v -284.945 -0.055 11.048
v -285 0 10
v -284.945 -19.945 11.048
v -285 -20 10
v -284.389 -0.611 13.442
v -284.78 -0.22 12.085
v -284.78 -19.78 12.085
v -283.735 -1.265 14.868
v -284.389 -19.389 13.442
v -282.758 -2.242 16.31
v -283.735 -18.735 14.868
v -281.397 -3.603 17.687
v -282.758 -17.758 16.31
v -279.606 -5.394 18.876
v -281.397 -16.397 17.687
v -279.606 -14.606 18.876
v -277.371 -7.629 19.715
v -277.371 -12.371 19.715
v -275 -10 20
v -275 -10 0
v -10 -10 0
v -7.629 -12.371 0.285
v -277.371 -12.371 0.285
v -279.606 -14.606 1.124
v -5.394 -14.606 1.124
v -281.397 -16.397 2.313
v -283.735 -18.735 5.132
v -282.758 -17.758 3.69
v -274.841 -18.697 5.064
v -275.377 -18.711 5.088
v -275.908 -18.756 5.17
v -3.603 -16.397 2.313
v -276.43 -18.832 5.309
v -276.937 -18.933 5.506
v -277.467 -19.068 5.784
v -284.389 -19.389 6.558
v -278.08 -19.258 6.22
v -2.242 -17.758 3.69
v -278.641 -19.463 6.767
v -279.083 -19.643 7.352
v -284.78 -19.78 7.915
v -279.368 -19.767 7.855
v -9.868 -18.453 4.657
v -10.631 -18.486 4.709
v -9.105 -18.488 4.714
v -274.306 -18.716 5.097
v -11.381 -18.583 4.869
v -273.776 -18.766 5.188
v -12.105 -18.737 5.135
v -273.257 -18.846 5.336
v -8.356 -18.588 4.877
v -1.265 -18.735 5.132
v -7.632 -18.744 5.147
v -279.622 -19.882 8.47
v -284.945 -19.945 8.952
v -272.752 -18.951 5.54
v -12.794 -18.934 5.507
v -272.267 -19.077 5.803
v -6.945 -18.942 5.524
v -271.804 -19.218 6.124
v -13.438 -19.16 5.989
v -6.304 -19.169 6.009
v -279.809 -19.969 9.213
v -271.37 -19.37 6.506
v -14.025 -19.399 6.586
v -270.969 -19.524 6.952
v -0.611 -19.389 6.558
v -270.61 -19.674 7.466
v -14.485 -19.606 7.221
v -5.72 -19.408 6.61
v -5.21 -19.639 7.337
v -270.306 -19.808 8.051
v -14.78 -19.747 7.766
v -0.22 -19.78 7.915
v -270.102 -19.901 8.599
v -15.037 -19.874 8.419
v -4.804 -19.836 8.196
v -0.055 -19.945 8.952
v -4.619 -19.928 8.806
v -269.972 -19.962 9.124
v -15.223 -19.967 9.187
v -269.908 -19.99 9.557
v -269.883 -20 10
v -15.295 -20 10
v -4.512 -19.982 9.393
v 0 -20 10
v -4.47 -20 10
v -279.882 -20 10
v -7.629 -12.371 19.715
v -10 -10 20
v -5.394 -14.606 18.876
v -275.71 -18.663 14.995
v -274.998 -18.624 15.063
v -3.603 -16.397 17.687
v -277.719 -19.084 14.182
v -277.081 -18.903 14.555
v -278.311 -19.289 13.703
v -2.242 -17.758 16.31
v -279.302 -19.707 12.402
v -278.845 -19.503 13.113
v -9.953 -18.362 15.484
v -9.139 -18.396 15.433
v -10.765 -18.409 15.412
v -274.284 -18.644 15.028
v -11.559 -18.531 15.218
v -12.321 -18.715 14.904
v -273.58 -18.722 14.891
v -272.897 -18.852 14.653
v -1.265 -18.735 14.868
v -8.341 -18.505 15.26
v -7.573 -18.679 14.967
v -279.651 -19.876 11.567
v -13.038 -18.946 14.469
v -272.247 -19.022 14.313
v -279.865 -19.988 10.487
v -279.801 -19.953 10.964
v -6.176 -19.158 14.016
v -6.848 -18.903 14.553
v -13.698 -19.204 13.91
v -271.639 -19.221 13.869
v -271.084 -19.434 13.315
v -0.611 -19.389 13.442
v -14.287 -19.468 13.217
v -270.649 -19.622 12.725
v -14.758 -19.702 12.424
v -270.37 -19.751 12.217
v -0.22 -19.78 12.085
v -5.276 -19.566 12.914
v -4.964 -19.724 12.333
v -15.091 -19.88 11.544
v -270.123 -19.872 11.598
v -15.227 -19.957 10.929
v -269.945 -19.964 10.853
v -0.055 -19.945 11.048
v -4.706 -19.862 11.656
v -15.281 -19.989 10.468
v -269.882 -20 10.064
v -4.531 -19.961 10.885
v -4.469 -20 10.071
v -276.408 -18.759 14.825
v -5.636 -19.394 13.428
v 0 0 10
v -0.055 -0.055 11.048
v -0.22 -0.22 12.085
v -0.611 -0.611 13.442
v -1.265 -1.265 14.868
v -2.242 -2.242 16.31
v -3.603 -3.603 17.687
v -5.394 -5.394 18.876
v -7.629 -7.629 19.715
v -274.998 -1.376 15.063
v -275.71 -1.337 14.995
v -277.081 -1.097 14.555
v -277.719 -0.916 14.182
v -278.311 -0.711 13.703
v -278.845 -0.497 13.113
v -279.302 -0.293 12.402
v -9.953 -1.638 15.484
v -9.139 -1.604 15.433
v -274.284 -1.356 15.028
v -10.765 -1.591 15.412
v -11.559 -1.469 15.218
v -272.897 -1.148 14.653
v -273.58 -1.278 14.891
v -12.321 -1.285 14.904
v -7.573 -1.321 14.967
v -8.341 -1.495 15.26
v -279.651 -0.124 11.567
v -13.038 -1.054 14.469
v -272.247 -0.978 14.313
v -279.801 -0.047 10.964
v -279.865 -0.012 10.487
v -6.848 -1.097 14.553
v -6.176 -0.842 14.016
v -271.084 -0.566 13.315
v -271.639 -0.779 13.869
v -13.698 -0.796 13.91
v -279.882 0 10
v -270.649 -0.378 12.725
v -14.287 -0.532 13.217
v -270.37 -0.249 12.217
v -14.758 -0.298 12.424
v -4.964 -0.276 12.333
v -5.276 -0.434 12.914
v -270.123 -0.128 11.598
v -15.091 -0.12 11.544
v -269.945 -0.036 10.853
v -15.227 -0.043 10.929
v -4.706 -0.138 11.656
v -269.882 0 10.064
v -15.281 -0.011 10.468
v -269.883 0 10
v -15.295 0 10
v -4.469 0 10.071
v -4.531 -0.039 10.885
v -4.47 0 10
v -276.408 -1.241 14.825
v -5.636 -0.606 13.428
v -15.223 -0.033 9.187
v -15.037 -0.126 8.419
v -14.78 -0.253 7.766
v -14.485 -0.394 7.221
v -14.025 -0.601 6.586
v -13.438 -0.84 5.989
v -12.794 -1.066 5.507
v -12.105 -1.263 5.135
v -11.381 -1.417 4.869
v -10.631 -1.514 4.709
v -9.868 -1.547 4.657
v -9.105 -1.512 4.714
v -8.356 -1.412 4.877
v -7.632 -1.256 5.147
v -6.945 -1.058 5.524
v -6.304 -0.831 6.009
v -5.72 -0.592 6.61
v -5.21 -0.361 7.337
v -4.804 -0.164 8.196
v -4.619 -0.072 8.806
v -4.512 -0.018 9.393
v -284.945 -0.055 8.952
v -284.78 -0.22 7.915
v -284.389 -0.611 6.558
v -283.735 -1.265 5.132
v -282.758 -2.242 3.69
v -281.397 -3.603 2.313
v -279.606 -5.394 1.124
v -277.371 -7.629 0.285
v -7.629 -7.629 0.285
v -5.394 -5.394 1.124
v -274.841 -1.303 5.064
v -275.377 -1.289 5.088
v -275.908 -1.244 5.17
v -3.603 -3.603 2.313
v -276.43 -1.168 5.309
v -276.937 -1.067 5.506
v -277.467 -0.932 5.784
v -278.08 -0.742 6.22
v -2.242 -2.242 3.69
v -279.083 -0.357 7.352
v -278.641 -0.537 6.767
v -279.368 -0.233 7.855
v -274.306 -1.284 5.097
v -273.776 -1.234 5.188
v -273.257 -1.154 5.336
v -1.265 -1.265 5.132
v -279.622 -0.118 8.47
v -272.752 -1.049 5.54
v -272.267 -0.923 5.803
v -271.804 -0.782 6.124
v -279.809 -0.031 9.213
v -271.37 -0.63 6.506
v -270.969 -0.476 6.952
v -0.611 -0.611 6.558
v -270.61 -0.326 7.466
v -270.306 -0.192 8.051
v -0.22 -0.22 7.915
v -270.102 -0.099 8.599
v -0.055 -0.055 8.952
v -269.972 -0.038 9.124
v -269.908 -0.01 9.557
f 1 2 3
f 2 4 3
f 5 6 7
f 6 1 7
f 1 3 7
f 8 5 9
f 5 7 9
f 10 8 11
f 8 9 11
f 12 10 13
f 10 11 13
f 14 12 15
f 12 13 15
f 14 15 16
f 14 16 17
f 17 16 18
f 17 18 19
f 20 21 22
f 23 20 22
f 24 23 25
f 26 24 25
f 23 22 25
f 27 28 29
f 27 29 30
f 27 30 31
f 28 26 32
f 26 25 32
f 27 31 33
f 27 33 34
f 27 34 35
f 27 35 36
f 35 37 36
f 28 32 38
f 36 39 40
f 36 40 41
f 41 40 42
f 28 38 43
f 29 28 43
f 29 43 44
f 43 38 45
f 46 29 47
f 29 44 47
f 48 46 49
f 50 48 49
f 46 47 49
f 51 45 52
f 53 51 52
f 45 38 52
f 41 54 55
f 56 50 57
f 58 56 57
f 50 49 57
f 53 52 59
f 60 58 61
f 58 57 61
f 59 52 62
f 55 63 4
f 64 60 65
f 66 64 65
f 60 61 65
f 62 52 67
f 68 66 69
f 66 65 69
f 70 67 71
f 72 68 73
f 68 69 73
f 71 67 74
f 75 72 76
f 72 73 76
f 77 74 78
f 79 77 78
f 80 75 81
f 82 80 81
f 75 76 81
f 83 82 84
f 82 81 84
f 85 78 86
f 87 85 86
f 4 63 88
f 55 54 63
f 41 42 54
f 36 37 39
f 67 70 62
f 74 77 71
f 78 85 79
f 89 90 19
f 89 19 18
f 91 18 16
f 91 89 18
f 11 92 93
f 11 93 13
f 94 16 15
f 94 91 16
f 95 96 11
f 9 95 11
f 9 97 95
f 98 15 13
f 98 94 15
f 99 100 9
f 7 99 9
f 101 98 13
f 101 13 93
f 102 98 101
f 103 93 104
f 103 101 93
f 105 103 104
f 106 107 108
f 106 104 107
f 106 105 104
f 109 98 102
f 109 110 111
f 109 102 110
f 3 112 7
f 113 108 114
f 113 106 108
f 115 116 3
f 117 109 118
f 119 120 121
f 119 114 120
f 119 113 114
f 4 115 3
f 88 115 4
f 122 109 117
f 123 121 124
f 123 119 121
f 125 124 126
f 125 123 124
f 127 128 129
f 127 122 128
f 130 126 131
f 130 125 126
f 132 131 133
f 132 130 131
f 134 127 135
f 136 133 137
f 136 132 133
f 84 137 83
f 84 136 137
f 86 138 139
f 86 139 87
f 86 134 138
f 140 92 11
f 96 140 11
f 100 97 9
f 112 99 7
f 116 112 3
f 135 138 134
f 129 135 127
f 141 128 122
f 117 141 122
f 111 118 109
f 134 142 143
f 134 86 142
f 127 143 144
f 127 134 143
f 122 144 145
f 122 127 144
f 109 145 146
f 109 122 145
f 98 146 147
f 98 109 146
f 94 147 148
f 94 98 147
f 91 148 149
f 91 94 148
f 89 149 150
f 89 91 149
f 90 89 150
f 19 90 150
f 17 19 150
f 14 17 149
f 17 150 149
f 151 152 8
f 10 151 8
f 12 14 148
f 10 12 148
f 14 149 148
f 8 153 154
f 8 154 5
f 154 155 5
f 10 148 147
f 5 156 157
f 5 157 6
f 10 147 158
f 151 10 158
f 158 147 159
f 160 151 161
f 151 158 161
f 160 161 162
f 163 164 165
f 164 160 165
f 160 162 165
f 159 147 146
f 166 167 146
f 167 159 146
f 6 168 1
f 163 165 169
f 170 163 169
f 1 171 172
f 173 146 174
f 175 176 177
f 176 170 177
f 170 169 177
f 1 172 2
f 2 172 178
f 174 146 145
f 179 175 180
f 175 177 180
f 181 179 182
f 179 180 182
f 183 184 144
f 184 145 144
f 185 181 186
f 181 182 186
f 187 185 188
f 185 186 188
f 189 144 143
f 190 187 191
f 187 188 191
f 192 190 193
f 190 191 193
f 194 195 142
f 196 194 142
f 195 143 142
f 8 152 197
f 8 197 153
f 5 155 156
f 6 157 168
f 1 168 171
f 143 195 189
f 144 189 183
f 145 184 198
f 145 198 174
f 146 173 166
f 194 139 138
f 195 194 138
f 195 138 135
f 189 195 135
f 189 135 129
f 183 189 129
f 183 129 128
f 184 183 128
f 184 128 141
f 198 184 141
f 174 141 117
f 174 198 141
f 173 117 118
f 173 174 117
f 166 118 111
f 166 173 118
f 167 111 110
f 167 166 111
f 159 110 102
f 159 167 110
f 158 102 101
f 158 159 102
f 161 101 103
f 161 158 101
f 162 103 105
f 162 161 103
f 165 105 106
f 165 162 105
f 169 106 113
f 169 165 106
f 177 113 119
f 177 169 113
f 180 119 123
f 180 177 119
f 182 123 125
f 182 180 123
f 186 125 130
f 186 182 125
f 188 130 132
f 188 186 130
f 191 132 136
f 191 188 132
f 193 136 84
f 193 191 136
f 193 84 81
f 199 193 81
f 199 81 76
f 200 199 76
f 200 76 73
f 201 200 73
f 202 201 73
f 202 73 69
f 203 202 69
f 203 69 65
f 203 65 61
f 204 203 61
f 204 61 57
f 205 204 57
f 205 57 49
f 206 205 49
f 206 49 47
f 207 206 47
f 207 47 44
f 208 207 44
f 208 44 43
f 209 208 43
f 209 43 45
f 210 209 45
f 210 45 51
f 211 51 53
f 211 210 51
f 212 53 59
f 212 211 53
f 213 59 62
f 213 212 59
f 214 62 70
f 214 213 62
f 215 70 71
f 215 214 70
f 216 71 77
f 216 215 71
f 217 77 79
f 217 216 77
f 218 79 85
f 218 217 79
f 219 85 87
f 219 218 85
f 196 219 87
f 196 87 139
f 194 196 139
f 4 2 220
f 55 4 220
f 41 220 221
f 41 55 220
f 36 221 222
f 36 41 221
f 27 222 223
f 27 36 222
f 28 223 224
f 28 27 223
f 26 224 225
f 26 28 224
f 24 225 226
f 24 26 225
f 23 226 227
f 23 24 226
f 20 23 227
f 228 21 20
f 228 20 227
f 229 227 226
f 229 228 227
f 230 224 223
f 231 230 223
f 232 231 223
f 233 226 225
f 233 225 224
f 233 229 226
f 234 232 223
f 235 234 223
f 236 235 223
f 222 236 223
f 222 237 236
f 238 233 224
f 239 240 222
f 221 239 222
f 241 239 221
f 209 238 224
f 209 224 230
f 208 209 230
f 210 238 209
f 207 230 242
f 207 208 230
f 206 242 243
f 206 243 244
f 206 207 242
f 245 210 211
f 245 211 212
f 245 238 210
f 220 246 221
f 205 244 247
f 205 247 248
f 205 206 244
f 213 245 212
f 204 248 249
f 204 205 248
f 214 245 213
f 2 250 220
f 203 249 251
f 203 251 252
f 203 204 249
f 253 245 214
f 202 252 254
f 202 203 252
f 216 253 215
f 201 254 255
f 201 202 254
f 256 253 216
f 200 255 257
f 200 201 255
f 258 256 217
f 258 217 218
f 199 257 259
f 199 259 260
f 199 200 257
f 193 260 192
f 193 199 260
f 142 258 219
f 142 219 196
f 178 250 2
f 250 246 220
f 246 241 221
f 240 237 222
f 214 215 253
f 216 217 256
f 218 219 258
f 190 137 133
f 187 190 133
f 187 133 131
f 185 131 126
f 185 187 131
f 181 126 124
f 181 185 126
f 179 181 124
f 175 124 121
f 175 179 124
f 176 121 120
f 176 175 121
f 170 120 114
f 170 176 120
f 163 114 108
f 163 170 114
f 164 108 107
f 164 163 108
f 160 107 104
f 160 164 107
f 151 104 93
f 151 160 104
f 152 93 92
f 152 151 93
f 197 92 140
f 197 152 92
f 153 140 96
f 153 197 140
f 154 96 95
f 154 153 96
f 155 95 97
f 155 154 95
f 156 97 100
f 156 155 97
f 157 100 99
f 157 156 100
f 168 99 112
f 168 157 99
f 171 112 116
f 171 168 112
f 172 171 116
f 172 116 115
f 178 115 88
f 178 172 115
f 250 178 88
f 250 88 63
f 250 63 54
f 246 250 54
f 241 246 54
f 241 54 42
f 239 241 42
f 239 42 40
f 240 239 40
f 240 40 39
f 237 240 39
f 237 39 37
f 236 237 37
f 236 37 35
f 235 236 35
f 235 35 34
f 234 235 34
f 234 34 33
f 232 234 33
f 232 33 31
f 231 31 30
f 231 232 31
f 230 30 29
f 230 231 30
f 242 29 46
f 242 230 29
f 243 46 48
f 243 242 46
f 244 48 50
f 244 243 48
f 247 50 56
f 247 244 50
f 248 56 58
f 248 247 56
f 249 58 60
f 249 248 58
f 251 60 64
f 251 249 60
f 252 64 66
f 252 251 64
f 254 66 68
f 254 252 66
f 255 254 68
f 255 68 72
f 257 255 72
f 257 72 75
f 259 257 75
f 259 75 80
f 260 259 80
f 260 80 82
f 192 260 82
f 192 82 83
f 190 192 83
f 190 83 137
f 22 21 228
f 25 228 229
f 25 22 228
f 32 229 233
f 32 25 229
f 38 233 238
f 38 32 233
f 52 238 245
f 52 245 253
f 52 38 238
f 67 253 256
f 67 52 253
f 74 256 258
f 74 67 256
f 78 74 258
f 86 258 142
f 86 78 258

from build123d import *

# Parameters (mm, degrees)
F0_W     = 285
F0_H     = 20
F1_DEPTH = 20
F2_R     = 9.99999
F3_R     = 5
F3_R_2   = 5.4133078472
F4_DEPTH = 20


# Not quite as in the source:
# - a fillet or chamfer is up to 0.001 mm smaller than in the source, because OpenCascade refuses the exact size


with BuildPart() as f1:
    # F0 (on Front) → F1 (new body)
    with BuildSketch(Plane.XZ):
        with Locations((-142.5, 10)):
            Rectangle(F0_W, F0_H)
    extrude(amount=F1_DEPTH)

    # F2 (radius 10 in the source; OpenCascade refuses exactly that, so slightly less here)
    f2_edges = [f1.edges().sort_by_distance(p)[0] for p in [
        (-142.5, -20, 20),
        (-142.5, 0, 20),
        (-142.5, -20, 0),
        (0, -10, 0),
        (-142.5, 0, 0),
        (-285, -10, 0),
        (0, -10, 20),
        (-285, -10, 20),
    ]]
    fillet(f2_edges, radius=F2_R)

    # F3 (on Front) → F4 (cut)
    with BuildSketch(Plane.XZ):
        with Locations((-274.8824357986, 10.0639369339)):
            Circle(F3_R)
        with Locations((-9.8824357986, 10.070726499)):
            Circle(F3_R_2)
    extrude(amount=F4_DEPTH, mode=Mode.SUBTRACT)


solid = f1.part
